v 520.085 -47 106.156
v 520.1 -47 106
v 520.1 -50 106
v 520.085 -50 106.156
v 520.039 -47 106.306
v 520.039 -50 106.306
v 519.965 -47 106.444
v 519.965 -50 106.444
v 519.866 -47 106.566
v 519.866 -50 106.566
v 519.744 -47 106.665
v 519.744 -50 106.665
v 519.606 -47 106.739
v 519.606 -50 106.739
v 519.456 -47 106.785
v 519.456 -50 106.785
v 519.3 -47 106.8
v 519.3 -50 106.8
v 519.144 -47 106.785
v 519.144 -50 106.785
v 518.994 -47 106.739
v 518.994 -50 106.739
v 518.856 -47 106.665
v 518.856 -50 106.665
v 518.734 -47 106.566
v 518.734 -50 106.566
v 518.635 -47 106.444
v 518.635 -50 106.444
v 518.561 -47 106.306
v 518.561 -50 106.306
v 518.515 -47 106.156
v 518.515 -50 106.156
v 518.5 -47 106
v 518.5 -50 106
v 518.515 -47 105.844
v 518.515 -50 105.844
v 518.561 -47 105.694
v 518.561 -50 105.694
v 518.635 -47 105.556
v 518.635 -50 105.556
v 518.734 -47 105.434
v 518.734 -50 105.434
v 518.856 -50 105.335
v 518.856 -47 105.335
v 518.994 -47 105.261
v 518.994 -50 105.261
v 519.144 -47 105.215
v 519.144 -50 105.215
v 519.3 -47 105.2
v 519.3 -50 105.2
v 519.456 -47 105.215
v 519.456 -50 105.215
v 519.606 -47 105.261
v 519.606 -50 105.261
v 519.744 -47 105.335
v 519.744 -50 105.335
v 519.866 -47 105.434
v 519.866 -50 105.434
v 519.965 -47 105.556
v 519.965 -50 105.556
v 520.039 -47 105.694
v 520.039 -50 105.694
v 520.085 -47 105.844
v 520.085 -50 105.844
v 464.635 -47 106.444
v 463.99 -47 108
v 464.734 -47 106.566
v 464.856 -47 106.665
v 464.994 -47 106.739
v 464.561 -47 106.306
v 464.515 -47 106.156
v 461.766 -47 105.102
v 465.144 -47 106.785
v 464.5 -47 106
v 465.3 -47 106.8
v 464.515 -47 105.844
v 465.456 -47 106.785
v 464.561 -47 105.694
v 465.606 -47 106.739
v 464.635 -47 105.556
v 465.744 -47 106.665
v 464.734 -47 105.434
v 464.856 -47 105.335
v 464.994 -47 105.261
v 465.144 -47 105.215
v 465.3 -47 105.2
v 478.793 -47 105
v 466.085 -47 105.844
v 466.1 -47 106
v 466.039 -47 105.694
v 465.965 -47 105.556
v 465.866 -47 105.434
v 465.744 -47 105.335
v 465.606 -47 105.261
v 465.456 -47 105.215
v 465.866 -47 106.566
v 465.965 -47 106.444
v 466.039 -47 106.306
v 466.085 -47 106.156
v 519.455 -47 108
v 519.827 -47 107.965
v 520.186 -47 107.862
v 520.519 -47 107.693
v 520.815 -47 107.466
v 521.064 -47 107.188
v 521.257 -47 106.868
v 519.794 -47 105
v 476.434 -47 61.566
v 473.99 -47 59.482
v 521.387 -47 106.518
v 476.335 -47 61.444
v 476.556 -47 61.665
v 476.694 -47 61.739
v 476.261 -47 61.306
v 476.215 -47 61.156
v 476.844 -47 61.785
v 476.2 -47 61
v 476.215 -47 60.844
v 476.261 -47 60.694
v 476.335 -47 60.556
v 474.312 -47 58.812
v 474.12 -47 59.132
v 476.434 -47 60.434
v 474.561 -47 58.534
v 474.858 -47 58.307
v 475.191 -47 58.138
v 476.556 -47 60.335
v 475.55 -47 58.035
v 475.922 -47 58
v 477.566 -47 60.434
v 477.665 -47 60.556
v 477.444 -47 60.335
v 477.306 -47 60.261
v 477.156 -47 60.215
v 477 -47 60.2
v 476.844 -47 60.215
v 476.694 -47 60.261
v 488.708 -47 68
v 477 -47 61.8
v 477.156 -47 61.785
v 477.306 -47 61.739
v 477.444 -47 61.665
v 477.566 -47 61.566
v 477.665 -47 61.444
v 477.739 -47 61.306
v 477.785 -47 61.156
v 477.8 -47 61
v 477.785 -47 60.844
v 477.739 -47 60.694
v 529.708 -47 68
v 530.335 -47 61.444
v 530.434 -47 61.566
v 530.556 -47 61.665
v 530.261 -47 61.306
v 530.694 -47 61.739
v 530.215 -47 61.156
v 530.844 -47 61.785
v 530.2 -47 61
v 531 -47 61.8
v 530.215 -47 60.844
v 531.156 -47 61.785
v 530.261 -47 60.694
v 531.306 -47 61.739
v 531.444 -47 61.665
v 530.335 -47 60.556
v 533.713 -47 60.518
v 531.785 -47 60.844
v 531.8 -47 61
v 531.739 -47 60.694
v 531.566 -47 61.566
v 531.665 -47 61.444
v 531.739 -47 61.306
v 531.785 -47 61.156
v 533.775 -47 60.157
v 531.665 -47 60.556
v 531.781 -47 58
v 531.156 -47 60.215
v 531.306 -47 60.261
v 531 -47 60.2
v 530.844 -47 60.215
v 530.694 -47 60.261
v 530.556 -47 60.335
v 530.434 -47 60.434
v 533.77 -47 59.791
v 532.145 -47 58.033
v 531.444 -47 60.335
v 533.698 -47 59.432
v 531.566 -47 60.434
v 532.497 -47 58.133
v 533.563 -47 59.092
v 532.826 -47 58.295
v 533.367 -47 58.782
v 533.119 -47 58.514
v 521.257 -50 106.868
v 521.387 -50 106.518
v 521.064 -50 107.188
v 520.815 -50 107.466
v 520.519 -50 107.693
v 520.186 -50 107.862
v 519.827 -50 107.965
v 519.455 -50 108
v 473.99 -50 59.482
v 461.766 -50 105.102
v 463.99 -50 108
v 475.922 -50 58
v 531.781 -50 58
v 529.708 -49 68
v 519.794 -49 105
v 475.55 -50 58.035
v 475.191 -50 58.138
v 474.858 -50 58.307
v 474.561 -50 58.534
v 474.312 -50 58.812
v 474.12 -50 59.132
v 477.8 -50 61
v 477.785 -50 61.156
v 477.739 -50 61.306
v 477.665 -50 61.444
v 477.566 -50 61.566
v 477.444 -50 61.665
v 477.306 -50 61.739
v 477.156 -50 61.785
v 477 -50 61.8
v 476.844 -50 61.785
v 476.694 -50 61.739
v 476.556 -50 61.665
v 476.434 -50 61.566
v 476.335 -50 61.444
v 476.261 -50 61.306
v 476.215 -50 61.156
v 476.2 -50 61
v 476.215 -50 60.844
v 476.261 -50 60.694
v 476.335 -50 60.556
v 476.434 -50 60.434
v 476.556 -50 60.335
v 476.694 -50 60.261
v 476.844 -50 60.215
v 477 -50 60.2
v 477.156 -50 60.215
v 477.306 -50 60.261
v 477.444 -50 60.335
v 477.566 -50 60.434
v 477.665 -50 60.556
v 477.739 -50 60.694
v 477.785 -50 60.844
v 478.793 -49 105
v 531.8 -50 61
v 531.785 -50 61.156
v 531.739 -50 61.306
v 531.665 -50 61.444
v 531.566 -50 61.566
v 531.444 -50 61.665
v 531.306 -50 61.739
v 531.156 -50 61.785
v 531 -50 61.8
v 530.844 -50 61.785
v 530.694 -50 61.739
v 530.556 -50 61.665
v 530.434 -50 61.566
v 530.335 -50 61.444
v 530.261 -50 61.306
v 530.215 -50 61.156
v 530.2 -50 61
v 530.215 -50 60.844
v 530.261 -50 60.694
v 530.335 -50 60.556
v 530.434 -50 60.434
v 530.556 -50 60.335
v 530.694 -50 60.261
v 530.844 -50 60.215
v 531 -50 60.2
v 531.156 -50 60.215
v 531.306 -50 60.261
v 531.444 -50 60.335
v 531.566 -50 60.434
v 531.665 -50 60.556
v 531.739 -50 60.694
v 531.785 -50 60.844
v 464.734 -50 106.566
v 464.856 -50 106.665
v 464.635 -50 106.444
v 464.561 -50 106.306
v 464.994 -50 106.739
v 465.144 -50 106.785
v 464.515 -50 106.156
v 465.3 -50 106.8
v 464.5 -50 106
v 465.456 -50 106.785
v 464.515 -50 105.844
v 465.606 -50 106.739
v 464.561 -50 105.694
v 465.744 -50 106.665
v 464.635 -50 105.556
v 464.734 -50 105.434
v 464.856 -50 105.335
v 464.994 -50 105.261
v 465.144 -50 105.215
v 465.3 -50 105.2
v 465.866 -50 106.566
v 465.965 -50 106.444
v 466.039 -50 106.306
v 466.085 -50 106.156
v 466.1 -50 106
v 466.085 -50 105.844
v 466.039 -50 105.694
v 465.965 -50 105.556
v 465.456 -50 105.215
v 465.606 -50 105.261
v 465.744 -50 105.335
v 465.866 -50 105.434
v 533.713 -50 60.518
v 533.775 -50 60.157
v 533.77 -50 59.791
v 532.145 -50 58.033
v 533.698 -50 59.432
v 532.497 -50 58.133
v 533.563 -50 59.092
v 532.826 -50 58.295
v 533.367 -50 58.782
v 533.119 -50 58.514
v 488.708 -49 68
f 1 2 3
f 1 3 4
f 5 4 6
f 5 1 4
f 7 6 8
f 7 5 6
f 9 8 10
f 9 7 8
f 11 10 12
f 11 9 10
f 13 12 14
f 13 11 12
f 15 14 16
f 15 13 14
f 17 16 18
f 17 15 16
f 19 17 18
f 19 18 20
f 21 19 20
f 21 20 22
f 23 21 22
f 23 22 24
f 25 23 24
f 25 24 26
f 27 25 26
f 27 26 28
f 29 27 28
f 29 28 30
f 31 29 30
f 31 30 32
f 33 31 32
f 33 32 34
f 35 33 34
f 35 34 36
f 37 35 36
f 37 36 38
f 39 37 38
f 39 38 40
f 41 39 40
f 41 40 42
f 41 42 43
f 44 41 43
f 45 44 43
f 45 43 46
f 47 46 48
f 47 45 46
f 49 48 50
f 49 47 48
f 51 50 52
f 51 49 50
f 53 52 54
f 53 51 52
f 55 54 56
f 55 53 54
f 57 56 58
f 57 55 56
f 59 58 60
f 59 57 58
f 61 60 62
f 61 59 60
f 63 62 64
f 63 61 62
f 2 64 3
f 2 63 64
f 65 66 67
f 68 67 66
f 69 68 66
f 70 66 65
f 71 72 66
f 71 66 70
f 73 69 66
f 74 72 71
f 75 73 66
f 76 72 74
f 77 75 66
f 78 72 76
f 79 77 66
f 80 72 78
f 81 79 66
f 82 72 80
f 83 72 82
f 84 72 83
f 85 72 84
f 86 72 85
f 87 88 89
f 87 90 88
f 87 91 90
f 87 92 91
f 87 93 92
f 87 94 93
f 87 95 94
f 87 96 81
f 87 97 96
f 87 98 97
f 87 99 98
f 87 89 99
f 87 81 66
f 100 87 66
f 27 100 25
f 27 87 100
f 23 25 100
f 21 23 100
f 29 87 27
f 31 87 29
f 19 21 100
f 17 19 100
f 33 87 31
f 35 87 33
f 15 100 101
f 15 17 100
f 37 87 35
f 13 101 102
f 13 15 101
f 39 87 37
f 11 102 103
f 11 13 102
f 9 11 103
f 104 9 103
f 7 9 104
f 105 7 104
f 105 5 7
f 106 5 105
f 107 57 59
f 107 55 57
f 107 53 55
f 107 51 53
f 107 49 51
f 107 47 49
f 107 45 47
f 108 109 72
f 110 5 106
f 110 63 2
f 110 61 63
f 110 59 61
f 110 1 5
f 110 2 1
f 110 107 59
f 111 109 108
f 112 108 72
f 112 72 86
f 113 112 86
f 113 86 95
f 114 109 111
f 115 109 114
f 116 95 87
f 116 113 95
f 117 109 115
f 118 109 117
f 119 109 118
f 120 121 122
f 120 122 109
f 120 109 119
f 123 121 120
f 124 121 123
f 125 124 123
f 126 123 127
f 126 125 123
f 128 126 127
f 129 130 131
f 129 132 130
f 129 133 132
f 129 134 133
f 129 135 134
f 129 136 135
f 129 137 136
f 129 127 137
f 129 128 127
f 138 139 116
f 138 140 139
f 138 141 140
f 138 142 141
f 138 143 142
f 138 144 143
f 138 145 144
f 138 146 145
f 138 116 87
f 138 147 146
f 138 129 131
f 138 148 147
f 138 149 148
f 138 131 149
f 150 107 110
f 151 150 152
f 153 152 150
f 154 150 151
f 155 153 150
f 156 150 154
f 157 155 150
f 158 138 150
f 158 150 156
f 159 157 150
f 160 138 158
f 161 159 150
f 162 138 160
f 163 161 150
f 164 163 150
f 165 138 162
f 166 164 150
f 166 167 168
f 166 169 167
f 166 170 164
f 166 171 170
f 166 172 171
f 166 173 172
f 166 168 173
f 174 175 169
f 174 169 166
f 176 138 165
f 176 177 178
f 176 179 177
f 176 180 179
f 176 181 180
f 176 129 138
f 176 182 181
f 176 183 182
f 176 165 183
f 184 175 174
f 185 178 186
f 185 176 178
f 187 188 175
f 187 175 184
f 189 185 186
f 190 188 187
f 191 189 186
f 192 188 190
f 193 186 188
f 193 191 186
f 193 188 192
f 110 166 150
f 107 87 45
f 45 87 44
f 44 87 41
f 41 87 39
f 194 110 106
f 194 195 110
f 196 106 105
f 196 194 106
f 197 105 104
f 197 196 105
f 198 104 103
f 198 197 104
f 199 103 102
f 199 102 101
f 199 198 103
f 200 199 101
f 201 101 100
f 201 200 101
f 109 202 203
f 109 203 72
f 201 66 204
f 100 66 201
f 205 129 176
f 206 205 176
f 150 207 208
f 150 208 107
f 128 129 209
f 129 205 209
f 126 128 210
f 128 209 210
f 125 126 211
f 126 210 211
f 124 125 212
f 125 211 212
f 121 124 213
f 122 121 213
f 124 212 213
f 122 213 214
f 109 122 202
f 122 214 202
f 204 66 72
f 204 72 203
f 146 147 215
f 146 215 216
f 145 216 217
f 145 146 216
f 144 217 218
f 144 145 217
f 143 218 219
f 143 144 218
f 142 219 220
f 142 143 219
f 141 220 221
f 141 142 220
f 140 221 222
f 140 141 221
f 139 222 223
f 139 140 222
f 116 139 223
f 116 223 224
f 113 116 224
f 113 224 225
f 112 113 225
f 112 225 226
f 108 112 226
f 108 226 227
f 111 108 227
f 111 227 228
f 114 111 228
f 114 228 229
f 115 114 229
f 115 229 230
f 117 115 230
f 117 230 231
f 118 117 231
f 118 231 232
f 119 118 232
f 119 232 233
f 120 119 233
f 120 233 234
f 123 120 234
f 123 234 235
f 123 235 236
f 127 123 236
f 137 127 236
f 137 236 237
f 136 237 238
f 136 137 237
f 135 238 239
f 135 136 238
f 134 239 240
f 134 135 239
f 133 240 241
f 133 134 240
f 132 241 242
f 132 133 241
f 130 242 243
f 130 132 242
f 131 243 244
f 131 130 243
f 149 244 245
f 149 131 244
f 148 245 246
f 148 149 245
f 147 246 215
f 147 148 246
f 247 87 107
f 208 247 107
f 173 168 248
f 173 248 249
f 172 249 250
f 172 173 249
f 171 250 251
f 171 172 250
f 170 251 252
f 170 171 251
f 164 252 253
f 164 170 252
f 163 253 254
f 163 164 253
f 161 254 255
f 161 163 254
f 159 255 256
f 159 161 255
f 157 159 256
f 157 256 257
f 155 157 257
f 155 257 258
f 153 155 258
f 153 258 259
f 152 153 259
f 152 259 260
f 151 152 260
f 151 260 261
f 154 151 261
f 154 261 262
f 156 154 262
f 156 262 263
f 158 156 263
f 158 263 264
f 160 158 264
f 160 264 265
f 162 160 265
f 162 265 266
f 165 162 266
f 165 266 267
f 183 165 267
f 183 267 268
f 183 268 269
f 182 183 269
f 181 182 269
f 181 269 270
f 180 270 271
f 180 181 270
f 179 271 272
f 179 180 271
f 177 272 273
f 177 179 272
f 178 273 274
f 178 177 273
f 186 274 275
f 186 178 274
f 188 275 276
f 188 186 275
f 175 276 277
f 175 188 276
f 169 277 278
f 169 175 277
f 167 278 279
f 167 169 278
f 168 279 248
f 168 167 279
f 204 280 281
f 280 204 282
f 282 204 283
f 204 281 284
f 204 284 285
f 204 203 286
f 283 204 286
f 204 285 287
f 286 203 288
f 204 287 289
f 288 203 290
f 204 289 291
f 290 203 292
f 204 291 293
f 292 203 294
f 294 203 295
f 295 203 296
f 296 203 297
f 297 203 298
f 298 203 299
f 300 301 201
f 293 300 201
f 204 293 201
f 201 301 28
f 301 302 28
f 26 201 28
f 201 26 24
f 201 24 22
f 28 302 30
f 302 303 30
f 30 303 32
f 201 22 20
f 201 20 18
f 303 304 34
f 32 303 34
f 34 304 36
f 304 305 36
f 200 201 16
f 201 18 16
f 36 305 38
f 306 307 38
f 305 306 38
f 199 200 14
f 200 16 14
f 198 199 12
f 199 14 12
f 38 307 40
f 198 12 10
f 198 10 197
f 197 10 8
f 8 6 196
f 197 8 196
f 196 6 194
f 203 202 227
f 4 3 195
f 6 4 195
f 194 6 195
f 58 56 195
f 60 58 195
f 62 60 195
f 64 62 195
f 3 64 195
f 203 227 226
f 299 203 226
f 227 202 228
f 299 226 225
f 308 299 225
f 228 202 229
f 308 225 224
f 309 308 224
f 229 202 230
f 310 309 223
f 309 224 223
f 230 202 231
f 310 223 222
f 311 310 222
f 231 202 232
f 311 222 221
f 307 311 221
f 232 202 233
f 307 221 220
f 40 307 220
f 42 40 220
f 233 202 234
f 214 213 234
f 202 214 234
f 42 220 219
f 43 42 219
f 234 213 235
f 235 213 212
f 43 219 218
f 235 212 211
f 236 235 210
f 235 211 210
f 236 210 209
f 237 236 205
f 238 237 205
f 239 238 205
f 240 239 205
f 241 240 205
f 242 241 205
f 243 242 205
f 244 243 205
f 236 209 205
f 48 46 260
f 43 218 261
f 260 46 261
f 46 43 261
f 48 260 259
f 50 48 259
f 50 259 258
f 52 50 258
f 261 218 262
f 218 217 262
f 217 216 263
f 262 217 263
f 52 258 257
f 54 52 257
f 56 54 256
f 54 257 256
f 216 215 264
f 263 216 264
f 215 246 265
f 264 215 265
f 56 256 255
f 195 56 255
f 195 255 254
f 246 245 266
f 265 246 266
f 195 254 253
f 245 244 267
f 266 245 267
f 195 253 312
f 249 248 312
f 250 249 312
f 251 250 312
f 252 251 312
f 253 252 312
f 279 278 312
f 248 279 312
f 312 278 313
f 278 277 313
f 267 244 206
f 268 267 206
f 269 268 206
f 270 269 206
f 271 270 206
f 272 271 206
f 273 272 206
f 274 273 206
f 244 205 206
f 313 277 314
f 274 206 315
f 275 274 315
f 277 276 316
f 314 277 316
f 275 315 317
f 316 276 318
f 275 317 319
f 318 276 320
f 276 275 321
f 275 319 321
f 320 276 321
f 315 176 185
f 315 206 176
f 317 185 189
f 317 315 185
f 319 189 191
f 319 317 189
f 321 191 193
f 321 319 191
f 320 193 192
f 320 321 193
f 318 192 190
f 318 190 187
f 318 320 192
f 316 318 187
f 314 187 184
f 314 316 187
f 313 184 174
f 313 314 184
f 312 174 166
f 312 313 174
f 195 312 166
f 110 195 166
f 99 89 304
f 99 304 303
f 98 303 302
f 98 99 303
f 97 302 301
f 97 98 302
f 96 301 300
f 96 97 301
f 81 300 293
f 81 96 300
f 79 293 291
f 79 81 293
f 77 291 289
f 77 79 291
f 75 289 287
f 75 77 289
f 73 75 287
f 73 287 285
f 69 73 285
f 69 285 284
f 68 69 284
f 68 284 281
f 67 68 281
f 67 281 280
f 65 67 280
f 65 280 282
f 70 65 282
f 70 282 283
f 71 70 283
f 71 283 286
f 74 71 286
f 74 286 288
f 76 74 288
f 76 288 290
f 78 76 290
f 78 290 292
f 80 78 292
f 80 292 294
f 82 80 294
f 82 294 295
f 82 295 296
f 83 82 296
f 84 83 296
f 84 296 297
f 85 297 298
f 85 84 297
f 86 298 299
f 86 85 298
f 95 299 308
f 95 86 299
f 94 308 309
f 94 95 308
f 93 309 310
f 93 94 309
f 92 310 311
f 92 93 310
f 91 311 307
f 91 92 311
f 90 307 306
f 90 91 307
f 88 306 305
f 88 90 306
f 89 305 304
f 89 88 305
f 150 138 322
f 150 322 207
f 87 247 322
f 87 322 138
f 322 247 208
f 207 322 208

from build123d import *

# Parameters (mm, degrees)
BOX061_W               = 37
BOX061_H               = 160
BOX061_DEPTH           = 120
BOX061_PITCH_ANGLE     = -15
BOX060_W               = 37.35
BOX060_H               = 160
BOX060_DEPTH           = 120
BOX060_PITCH_ANGLE     = -15
BOX062_W               = 64
BOX062_H               = 5
BOX062_DEPTH           = 37
CYLINDER059_R          = 0.8
CYLINDER059_DEPTH      = 9
CYLINDER059_ROLL_ANGLE = 90
CYLINDER060_R          = 0.8
CYLINDER060_DEPTH      = 9
CYLINDER060_ROLL_ANGLE = 90
CYLINDER061_R          = 0.8
CYLINDER061_DEPTH      = 9
CYLINDER061_ROLL_ANGLE = 90
CYLINDER062_R          = 0.8
CYLINDER062_DEPTH      = 9
CYLINDER062_ROLL_ANGLE = 90
BOX067_W               = 37
BOX067_H               = 160
BOX067_DEPTH           = 120
BOX067_PITCH_ANGLE     = -15
BOX066_W               = 37.35
BOX066_H               = 160
BOX066_DEPTH           = 120
BOX066_PITCH_ANGLE     = -15
BOX065_W               = 76
BOX065_H               = 3
BOX065_DEPTH           = 50
FILLET007_R            = 2
CHAMFER004_SIZE        = 3


with BuildPart() as cube033:
    # Box061 → Box061 (new body)
    with BuildSketch(Plane.XY):
        with Locations((18.5, 80)):
            Rectangle(BOX061_W, BOX061_H)
    extrude(amount=BOX061_DEPTH)


with BuildPart() as cube033_1:
    # Box061 pitch: moved
    add(cube033.part.rotate(Axis((0, 0, 0), (0, 1, 0)), BOX061_PITCH_ANGLE))


with BuildPart() as cube033_2:
    # Box061 placement: moved
    add(cube033_1.part.moved(Location((549, -50, -4))))


with BuildPart() as fusion056:
    # Box060 → Box060 (new body)
    with BuildSketch(Plane.XY):
        with Locations((18.675, 80)):
            Rectangle(BOX060_W, BOX060_H)
    extrude(amount=BOX060_DEPTH)


with BuildPart() as fusion056_1:
    # Box060 pitch: moved
    add(fusion056.part.rotate(Axis((0, 0, 0), (0, 1, 0)), BOX060_PITCH_ANGLE))


with BuildPart() as fusion056_2:
    # Box060 placement: moved
    add(fusion056_1.part.moved(Location((470.94, -50, -10))))

    # Fusion056: union Cube033
    add(cube033_2.part)


with BuildPart() as cut078:
    # Box062 → Box062 (new body)
    with BuildSketch(Plane(origin=(468, -49, 68), x_dir=(1, 0, 0), z_dir=(0, 0, 1))):
        with Locations((32, 2.5)):
            Rectangle(BOX062_W, BOX062_H)
    extrude(amount=BOX062_DEPTH)

    # Cut078: cut Fusion056
    add(fusion056_2.part, mode=Mode.SUBTRACT)


with BuildPart() as cylinder059:
    # Cylinder059 → Cylinder059 (new body)
    with BuildSketch(Plane.XY):
        Circle(CYLINDER059_R)
    extrude(amount=CYLINDER059_DEPTH)


with BuildPart() as cylinder059_1:
    # Cylinder059 roll: moved
    add(cylinder059.part.rotate(Axis((0, 0, 0), (1, 0, 0)), CYLINDER059_ROLL_ANGLE))


with BuildPart() as cylinder059_2:
    # Cylinder059 placement: moved
    add(cylinder059_1.part.moved(Location((519.3, -40, 106))))


with BuildPart() as fusion061:
    # Cylinder060 → Cylinder060 (new body)
    with BuildSketch(Plane.XY):
        Circle(CYLINDER060_R)
    extrude(amount=CYLINDER060_DEPTH)


with BuildPart() as fusion061_1:
    # Cylinder060 roll: moved
    add(fusion061.part.rotate(Axis((0, 0, 0), (1, 0, 0)), CYLINDER060_ROLL_ANGLE))


with BuildPart() as fusion061_2:
    # Cylinder060 placement: moved
    add(fusion061_1.part.moved(Location((531, -40, 61))))

    # Fusion061: union Cylinder059
    add(cylinder059_2.part)


with BuildPart() as cylinder061:
    # Cylinder061 → Cylinder061 (new body)
    with BuildSketch(Plane.XY):
        Circle(CYLINDER061_R)
    extrude(amount=CYLINDER061_DEPTH)


with BuildPart() as cylinder061_1:
    # Cylinder061 roll: moved
    add(cylinder061.part.rotate(Axis((0, 0, 0), (1, 0, 0)), CYLINDER061_ROLL_ANGLE))


with BuildPart() as cylinder061_2:
    # Cylinder061 placement: moved
    add(cylinder061_1.part.moved(Location((519.3, -40, 106))))


with BuildPart() as fusion062:
    # Cylinder062 → Cylinder062 (new body)
    with BuildSketch(Plane.XY):
        Circle(CYLINDER062_R)
    extrude(amount=CYLINDER062_DEPTH)


with BuildPart() as fusion062_1:
    # Cylinder062 roll: moved
    add(fusion062.part.rotate(Axis((0, 0, 0), (1, 0, 0)), CYLINDER062_ROLL_ANGLE))


with BuildPart() as fusion062_2:
    # Cylinder062 placement: moved
    add(fusion062_1.part.moved(Location((531, -40, 61))))

    # Fusion063: union Cylinder061
    add(cylinder061_2.part)


with BuildPart() as fusion062_3:
    # Fusion063 placement: moved
    add(fusion062_2.part.moved(Location((-54, 0, 0))))

    # Fusion062: union Fusion061
    add(fusion061_2.part)


with BuildPart() as fusion062_4:
    # Fusion062 placement: moved
    add(fusion062_3.part.moved(Location((0, -1, 0))))


with BuildPart() as cube039:
    # Box067 → Box067 (new body)
    with BuildSketch(Plane.XY):
        with Locations((18.5, 80)):
            Rectangle(BOX067_W, BOX067_H)
    extrude(amount=BOX067_DEPTH)


with BuildPart() as cube039_1:
    # Box067 pitch: moved
    add(cube039.part.rotate(Axis((0, 0, 0), (0, 1, 0)), BOX067_PITCH_ANGLE))


with BuildPart() as cube039_2:
    # Box067 placement: moved
    add(cube039_1.part.moved(Location((551, -50, -4))))


with BuildPart() as fusion060:
    # Box066 → Box066 (new body)
    with BuildSketch(Plane.XY):
        with Locations((18.675, 80)):
            Rectangle(BOX066_W, BOX066_H)
    extrude(amount=BOX066_DEPTH)


with BuildPart() as fusion060_1:
    # Box066 pitch: moved
    add(fusion060.part.rotate(Axis((0, 0, 0), (0, 1, 0)), BOX066_PITCH_ANGLE))


with BuildPart() as fusion060_2:
    # Box066 placement: moved
    add(fusion060_1.part.moved(Location((453.94, -50, -10))))

    # Fusion060: union Cube039
    add(cube039_2.part)


with BuildPart() as left_back_door_mech_cover:
    # Box065 → Box065 (new body)
    with BuildSketch(Plane(origin=(460, -49, 58), x_dir=(1, 0, 0), z_dir=(0, 0, 1))):
        with Locations((38, 1.5)):
            Rectangle(BOX065_W, BOX065_H)
    extrude(amount=BOX065_DEPTH)

    # Cut063: cut Fusion060
    add(fusion060_2.part, mode=Mode.SUBTRACT)


with BuildPart() as left_back_door_mech_cover_1:
    # Cut063 placement: moved
    add(left_back_door_mech_cover.part.moved(Location((0, -1, 0))))

    # Cut064: cut Fusion062
    add(fusion062_4.part, mode=Mode.SUBTRACT)

    # Fillet007
    fillet007_edges = [left_back_door_mech_cover_1.edges().sort_by_distance(p)[0] for p in [
        (534.38715, -48.5, 58),
        (474.38702, -48.5, 58),
        (520.98969, -48.5, 108),
    ]]
    fillet(fillet007_edges, radius=FILLET007_R)

    # Chamfer004
    chamfer004_edges = [left_back_door_mech_cover_1.edges().sort_by_distance(p)[0] for p in [
        (460.989561, -48.5, 108),
    ]]
    chamfer(chamfer004_edges, length=CHAMFER004_SIZE)

    # Cut079: cut Cut078
    add(cut078.part, mode=Mode.SUBTRACT)


solid = left_back_door_mech_cover_1.part
